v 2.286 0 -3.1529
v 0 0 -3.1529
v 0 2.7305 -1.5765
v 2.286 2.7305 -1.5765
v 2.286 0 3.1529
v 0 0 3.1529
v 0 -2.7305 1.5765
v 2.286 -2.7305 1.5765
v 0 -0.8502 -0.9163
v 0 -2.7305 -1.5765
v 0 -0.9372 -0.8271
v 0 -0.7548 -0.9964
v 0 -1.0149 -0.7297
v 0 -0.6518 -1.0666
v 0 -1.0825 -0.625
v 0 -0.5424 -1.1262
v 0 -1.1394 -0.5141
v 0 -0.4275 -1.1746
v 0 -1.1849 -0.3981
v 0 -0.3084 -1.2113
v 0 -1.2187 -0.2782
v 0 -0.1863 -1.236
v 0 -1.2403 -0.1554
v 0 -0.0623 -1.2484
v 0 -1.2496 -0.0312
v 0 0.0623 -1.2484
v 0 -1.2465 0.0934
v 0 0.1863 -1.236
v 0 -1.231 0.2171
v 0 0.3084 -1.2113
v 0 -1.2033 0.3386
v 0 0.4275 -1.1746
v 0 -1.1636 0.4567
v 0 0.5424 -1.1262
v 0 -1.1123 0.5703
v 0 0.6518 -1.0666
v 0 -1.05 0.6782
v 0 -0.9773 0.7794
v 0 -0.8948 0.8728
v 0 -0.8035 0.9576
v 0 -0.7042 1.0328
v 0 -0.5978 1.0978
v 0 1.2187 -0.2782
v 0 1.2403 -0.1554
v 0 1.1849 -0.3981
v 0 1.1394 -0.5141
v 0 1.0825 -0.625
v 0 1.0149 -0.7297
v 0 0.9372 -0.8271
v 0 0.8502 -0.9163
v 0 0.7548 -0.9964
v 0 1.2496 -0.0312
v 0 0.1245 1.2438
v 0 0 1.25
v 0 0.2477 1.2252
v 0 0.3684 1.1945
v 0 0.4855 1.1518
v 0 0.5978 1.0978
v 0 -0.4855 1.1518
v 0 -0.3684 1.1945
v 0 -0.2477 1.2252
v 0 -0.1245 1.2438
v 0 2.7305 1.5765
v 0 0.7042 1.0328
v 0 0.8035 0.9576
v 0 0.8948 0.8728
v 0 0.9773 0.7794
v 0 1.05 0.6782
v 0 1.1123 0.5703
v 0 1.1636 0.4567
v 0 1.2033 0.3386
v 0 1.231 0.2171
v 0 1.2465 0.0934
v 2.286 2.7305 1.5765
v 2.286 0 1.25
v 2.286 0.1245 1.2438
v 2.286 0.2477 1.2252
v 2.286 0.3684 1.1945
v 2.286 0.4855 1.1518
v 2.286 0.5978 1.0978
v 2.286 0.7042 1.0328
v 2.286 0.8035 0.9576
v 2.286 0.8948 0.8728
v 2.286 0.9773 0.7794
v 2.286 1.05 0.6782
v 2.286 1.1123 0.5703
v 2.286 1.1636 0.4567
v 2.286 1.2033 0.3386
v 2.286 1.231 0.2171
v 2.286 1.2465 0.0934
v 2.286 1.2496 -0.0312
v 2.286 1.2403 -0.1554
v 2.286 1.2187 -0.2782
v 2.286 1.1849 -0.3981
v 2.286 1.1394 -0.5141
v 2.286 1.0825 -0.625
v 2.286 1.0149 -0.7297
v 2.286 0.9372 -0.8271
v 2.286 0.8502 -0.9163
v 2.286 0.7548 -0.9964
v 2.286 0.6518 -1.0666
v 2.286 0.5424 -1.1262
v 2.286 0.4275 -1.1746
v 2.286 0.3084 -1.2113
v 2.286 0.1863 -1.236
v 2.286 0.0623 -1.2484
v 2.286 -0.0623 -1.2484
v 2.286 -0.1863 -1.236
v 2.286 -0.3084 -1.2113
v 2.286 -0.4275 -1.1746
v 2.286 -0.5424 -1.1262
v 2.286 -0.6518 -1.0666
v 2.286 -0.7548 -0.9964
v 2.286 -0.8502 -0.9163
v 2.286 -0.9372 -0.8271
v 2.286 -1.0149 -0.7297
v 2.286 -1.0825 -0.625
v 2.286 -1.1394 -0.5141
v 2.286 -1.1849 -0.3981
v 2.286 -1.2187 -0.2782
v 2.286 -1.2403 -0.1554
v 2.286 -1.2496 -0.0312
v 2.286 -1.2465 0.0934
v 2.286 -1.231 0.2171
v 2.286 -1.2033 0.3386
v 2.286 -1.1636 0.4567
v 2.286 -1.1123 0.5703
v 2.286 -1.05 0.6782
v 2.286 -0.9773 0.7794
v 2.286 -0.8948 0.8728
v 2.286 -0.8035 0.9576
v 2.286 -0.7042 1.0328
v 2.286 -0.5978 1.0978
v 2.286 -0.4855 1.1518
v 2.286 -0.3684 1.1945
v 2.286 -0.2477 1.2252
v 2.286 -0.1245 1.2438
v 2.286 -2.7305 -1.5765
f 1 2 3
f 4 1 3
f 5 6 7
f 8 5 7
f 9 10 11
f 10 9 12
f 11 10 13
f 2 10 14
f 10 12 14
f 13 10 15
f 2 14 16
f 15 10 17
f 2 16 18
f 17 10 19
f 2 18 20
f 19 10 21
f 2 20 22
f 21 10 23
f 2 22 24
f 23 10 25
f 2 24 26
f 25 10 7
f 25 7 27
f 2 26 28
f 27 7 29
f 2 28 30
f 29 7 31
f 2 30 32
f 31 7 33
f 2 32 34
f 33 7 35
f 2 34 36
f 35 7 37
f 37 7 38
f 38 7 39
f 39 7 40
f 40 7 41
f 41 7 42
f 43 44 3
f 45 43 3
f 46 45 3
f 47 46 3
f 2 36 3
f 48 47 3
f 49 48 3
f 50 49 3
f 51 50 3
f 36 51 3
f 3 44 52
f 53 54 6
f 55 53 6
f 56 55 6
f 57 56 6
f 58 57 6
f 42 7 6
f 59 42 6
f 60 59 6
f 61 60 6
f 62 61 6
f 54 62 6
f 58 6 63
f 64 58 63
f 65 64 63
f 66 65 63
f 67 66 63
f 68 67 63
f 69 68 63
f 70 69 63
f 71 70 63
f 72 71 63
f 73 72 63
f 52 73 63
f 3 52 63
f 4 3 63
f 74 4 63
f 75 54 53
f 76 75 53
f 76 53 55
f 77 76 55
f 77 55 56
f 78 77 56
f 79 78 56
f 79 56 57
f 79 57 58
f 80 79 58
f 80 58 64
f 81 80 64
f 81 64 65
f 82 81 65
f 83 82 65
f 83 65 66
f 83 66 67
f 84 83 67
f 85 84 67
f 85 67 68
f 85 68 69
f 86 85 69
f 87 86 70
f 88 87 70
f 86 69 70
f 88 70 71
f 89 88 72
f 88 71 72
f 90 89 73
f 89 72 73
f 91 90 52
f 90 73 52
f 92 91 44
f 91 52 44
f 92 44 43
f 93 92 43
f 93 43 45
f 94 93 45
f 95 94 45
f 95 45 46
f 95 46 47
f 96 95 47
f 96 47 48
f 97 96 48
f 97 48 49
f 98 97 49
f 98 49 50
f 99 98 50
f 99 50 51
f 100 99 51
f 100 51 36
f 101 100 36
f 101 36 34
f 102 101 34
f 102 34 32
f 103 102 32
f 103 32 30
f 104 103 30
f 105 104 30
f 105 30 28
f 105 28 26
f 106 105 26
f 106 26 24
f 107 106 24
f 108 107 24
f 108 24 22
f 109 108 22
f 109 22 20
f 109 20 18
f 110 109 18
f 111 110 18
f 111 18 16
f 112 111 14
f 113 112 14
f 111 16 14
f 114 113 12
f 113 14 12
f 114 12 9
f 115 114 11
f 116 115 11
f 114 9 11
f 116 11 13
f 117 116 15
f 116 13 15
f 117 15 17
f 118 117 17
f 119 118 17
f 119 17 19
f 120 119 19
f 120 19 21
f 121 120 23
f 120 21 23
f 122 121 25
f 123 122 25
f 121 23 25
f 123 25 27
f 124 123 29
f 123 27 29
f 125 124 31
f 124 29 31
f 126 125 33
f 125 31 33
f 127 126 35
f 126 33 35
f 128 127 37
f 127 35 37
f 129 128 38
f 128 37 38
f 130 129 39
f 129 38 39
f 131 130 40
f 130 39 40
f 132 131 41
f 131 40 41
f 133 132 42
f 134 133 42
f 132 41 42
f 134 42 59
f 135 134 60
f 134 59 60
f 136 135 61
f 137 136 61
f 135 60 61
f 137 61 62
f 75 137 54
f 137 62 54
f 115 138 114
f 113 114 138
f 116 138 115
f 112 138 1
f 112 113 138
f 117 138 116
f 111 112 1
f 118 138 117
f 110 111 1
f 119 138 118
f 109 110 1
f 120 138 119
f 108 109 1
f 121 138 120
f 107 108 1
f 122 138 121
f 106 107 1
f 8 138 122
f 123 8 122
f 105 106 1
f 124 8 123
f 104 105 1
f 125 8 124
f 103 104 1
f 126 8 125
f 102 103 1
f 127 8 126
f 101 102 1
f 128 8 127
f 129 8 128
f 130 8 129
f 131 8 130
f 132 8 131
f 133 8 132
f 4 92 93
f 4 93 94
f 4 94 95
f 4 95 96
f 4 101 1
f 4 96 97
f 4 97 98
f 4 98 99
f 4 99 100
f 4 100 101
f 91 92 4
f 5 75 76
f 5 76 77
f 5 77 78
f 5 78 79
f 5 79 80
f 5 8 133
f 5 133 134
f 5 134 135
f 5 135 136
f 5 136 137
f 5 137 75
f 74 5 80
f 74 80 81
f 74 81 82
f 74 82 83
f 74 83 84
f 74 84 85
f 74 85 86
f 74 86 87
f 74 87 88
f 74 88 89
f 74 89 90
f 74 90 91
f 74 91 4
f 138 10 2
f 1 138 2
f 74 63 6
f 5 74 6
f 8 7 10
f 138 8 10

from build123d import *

# Parameters (mm, degrees)
BOSS_EXTRUDE1_DEPTH             = 2.286
TAP_DRILL_FOR_M3X0_5_TAP1_D     = 2.5
TAP_DRILL_FOR_M3X0_5_TAP1_DEPTH = 25.4
TAP_DRILL_FOR_M3X0_5_TAP1_TIP   = 0.751075774


with BuildPart() as part:
    # Sketch1 → Boss-Extrude1 (new body)
    with BuildSketch(Plane.YZ):
        Polygon((0, -3.15290982), (2.7305, -1.57645491), (2.7305, 1.57645491), (0, 3.15290982), (-2.7305, 1.57645491), (-2.7305, -1.57645491), align=None)
    extrude(amount=BOSS_EXTRUDE1_DEPTH)

    # Tap Drill for M3x0.5 Tap1
    with Locations(Plane(origin=(2.286, 0, 0), x_dir=(0, 0, -1), z_dir=(1, 0, 0))):
        with Locations((0, 0)):
            Hole(TAP_DRILL_FOR_M3X0_5_TAP1_D / 2, depth=TAP_DRILL_FOR_M3X0_5_TAP1_DEPTH)
            with Locations((0, 0, -(TAP_DRILL_FOR_M3X0_5_TAP1_DEPTH + TAP_DRILL_FOR_M3X0_5_TAP1_TIP / 2))):  # 118° drill point
                Cone(0, TAP_DRILL_FOR_M3X0_5_TAP1_D / 2, TAP_DRILL_FOR_M3X0_5_TAP1_TIP, mode=Mode.SUBTRACT)


solid = part.part
